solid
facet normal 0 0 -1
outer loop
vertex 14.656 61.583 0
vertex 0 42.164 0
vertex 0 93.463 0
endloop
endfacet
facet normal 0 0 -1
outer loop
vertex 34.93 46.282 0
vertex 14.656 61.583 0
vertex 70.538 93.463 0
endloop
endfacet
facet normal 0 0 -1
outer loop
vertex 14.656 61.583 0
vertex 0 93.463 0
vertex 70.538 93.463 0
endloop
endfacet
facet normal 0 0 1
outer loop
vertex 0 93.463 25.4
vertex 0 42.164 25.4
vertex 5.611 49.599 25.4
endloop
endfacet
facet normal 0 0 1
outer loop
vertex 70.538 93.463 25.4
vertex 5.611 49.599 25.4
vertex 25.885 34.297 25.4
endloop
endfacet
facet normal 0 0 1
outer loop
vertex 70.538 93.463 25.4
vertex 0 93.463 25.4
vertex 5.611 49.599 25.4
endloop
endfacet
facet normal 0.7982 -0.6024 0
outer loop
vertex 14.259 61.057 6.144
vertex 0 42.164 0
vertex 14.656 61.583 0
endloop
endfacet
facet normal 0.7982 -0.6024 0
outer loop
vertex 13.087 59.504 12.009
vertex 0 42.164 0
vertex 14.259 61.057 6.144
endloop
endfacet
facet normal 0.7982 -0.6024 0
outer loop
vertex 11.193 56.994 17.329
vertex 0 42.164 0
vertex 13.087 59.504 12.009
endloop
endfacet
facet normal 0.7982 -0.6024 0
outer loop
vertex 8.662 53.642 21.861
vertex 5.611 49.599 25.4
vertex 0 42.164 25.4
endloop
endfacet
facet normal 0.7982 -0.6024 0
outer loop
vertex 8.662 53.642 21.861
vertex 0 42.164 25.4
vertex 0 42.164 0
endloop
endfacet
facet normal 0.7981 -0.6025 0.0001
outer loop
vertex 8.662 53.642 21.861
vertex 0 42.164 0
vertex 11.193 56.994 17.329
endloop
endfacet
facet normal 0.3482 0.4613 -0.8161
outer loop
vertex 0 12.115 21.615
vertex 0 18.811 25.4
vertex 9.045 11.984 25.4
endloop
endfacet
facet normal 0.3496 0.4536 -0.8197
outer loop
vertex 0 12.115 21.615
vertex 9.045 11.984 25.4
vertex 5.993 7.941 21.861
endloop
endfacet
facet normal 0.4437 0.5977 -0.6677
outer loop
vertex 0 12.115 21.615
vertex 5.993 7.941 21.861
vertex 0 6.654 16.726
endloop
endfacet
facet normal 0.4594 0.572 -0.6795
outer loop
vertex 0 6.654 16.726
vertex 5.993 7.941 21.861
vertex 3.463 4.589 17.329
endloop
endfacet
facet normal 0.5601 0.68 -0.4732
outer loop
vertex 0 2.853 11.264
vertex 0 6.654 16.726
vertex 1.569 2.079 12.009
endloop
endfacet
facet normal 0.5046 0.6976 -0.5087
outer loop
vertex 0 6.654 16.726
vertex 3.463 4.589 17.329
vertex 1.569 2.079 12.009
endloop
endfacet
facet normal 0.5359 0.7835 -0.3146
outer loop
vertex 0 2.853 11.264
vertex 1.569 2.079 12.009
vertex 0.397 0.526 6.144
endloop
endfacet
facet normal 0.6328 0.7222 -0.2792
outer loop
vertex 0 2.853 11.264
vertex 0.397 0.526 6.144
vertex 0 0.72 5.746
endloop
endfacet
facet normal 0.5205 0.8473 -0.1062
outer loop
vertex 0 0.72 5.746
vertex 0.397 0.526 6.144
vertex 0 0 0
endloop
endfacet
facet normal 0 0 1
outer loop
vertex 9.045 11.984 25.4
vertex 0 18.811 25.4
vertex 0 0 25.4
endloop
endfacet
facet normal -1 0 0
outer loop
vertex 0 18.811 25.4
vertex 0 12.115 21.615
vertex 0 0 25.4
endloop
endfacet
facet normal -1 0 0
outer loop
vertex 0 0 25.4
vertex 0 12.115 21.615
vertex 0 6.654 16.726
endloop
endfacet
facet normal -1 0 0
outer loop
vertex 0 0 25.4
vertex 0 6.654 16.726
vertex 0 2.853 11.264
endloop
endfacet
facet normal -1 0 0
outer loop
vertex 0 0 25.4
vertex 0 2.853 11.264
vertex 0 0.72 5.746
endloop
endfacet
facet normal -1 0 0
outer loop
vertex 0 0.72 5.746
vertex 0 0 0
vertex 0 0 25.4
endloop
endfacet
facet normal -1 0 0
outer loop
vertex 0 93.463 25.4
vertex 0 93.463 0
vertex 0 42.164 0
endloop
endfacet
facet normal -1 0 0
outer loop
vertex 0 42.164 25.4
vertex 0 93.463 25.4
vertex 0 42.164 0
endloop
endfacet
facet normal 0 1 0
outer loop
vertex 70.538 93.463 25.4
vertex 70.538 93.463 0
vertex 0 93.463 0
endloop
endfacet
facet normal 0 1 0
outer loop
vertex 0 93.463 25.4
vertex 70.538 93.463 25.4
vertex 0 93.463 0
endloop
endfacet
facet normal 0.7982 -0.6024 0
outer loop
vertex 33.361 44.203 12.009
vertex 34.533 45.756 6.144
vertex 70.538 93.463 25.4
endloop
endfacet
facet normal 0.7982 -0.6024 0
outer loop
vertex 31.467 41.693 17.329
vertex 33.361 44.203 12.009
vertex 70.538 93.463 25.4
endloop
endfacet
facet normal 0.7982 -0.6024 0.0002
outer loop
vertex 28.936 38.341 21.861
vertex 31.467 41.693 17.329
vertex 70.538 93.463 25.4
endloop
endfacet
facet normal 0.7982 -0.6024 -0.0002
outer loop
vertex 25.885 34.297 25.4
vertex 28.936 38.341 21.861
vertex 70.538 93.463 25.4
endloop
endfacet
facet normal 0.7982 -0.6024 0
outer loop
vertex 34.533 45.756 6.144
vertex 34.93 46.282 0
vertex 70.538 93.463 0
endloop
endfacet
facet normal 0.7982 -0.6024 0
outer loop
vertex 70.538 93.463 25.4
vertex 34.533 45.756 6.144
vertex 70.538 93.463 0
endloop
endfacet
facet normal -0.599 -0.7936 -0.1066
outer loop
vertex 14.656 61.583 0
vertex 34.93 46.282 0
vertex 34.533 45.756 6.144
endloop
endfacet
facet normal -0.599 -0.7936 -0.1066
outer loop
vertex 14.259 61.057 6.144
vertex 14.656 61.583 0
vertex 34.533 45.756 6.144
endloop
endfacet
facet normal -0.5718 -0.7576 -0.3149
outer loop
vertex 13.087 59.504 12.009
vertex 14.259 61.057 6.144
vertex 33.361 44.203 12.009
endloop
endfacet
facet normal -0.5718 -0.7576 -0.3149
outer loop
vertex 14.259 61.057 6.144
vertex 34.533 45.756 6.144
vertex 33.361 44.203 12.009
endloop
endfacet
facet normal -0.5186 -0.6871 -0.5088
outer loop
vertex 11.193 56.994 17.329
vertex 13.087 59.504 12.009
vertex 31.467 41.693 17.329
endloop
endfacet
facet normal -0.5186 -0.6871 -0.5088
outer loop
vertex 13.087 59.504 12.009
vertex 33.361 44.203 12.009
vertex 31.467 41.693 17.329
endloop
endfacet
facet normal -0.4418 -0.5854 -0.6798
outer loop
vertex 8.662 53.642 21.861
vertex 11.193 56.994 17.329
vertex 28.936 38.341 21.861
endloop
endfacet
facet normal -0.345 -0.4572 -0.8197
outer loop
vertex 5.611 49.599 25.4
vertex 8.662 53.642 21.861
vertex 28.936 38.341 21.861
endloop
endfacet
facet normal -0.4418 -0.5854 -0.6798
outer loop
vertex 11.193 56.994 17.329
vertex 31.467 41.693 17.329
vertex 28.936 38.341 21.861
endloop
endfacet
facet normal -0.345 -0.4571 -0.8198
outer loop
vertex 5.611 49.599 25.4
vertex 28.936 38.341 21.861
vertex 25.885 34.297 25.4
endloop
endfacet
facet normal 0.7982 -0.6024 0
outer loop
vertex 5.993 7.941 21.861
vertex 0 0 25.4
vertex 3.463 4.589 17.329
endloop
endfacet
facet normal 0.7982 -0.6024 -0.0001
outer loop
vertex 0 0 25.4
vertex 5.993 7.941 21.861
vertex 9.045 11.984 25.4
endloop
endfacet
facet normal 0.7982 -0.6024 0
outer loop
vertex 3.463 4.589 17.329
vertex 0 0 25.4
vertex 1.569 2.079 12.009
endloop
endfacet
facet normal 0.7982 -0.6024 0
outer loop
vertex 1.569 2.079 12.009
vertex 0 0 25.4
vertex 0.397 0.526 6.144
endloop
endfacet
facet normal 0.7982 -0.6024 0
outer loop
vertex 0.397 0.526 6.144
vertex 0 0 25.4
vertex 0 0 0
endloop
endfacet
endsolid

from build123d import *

# Parameters (mm, degrees)
F1_DEPTH = 25.4
F3_DEPTH = 25.4


with BuildPart() as f1:
    # F0 (on Top) → F1 (new body)
    with BuildSketch(Plane.XY):
        Polygon((0, 93.4634655714), (0, 0), (70.538379252, 93.4634655714), align=None)
    extrude(amount=F1_DEPTH)

    # F2 (on face) → F3 (cut)
    with BuildSketch(Plane(origin=(0, 0, 0), x_dir=(0.6024064416, 0.7981895007, 0), z_dir=(0.7981895007, -0.6024064416, 0))):
        with BuildLine():
            ThreePointArc((15.0145222435, 25.4), (4.0343271511, 14.75293088), (0, 0))
            Line((0, 0), (57.9835884273, 0))
            ThreePointArc((57.9835884273, 0), (53.9492612762, 14.75293088), (42.9690661838, 25.4))
            Line((42.9690661838, 25.4), (15.0145222435, 25.4))
        make_face()
        with BuildLine():
            ThreePointArc((42.9690661838, 25.4), (28.9917942137, 28.9917942137), (15.0145222435, 25.4))
            Line((15.0145222435, 25.4), (42.9690661838, 25.4))
        make_face()
    extrude(amount=-F3_DEPTH, mode=Mode.SUBTRACT)


solid = f1.part
